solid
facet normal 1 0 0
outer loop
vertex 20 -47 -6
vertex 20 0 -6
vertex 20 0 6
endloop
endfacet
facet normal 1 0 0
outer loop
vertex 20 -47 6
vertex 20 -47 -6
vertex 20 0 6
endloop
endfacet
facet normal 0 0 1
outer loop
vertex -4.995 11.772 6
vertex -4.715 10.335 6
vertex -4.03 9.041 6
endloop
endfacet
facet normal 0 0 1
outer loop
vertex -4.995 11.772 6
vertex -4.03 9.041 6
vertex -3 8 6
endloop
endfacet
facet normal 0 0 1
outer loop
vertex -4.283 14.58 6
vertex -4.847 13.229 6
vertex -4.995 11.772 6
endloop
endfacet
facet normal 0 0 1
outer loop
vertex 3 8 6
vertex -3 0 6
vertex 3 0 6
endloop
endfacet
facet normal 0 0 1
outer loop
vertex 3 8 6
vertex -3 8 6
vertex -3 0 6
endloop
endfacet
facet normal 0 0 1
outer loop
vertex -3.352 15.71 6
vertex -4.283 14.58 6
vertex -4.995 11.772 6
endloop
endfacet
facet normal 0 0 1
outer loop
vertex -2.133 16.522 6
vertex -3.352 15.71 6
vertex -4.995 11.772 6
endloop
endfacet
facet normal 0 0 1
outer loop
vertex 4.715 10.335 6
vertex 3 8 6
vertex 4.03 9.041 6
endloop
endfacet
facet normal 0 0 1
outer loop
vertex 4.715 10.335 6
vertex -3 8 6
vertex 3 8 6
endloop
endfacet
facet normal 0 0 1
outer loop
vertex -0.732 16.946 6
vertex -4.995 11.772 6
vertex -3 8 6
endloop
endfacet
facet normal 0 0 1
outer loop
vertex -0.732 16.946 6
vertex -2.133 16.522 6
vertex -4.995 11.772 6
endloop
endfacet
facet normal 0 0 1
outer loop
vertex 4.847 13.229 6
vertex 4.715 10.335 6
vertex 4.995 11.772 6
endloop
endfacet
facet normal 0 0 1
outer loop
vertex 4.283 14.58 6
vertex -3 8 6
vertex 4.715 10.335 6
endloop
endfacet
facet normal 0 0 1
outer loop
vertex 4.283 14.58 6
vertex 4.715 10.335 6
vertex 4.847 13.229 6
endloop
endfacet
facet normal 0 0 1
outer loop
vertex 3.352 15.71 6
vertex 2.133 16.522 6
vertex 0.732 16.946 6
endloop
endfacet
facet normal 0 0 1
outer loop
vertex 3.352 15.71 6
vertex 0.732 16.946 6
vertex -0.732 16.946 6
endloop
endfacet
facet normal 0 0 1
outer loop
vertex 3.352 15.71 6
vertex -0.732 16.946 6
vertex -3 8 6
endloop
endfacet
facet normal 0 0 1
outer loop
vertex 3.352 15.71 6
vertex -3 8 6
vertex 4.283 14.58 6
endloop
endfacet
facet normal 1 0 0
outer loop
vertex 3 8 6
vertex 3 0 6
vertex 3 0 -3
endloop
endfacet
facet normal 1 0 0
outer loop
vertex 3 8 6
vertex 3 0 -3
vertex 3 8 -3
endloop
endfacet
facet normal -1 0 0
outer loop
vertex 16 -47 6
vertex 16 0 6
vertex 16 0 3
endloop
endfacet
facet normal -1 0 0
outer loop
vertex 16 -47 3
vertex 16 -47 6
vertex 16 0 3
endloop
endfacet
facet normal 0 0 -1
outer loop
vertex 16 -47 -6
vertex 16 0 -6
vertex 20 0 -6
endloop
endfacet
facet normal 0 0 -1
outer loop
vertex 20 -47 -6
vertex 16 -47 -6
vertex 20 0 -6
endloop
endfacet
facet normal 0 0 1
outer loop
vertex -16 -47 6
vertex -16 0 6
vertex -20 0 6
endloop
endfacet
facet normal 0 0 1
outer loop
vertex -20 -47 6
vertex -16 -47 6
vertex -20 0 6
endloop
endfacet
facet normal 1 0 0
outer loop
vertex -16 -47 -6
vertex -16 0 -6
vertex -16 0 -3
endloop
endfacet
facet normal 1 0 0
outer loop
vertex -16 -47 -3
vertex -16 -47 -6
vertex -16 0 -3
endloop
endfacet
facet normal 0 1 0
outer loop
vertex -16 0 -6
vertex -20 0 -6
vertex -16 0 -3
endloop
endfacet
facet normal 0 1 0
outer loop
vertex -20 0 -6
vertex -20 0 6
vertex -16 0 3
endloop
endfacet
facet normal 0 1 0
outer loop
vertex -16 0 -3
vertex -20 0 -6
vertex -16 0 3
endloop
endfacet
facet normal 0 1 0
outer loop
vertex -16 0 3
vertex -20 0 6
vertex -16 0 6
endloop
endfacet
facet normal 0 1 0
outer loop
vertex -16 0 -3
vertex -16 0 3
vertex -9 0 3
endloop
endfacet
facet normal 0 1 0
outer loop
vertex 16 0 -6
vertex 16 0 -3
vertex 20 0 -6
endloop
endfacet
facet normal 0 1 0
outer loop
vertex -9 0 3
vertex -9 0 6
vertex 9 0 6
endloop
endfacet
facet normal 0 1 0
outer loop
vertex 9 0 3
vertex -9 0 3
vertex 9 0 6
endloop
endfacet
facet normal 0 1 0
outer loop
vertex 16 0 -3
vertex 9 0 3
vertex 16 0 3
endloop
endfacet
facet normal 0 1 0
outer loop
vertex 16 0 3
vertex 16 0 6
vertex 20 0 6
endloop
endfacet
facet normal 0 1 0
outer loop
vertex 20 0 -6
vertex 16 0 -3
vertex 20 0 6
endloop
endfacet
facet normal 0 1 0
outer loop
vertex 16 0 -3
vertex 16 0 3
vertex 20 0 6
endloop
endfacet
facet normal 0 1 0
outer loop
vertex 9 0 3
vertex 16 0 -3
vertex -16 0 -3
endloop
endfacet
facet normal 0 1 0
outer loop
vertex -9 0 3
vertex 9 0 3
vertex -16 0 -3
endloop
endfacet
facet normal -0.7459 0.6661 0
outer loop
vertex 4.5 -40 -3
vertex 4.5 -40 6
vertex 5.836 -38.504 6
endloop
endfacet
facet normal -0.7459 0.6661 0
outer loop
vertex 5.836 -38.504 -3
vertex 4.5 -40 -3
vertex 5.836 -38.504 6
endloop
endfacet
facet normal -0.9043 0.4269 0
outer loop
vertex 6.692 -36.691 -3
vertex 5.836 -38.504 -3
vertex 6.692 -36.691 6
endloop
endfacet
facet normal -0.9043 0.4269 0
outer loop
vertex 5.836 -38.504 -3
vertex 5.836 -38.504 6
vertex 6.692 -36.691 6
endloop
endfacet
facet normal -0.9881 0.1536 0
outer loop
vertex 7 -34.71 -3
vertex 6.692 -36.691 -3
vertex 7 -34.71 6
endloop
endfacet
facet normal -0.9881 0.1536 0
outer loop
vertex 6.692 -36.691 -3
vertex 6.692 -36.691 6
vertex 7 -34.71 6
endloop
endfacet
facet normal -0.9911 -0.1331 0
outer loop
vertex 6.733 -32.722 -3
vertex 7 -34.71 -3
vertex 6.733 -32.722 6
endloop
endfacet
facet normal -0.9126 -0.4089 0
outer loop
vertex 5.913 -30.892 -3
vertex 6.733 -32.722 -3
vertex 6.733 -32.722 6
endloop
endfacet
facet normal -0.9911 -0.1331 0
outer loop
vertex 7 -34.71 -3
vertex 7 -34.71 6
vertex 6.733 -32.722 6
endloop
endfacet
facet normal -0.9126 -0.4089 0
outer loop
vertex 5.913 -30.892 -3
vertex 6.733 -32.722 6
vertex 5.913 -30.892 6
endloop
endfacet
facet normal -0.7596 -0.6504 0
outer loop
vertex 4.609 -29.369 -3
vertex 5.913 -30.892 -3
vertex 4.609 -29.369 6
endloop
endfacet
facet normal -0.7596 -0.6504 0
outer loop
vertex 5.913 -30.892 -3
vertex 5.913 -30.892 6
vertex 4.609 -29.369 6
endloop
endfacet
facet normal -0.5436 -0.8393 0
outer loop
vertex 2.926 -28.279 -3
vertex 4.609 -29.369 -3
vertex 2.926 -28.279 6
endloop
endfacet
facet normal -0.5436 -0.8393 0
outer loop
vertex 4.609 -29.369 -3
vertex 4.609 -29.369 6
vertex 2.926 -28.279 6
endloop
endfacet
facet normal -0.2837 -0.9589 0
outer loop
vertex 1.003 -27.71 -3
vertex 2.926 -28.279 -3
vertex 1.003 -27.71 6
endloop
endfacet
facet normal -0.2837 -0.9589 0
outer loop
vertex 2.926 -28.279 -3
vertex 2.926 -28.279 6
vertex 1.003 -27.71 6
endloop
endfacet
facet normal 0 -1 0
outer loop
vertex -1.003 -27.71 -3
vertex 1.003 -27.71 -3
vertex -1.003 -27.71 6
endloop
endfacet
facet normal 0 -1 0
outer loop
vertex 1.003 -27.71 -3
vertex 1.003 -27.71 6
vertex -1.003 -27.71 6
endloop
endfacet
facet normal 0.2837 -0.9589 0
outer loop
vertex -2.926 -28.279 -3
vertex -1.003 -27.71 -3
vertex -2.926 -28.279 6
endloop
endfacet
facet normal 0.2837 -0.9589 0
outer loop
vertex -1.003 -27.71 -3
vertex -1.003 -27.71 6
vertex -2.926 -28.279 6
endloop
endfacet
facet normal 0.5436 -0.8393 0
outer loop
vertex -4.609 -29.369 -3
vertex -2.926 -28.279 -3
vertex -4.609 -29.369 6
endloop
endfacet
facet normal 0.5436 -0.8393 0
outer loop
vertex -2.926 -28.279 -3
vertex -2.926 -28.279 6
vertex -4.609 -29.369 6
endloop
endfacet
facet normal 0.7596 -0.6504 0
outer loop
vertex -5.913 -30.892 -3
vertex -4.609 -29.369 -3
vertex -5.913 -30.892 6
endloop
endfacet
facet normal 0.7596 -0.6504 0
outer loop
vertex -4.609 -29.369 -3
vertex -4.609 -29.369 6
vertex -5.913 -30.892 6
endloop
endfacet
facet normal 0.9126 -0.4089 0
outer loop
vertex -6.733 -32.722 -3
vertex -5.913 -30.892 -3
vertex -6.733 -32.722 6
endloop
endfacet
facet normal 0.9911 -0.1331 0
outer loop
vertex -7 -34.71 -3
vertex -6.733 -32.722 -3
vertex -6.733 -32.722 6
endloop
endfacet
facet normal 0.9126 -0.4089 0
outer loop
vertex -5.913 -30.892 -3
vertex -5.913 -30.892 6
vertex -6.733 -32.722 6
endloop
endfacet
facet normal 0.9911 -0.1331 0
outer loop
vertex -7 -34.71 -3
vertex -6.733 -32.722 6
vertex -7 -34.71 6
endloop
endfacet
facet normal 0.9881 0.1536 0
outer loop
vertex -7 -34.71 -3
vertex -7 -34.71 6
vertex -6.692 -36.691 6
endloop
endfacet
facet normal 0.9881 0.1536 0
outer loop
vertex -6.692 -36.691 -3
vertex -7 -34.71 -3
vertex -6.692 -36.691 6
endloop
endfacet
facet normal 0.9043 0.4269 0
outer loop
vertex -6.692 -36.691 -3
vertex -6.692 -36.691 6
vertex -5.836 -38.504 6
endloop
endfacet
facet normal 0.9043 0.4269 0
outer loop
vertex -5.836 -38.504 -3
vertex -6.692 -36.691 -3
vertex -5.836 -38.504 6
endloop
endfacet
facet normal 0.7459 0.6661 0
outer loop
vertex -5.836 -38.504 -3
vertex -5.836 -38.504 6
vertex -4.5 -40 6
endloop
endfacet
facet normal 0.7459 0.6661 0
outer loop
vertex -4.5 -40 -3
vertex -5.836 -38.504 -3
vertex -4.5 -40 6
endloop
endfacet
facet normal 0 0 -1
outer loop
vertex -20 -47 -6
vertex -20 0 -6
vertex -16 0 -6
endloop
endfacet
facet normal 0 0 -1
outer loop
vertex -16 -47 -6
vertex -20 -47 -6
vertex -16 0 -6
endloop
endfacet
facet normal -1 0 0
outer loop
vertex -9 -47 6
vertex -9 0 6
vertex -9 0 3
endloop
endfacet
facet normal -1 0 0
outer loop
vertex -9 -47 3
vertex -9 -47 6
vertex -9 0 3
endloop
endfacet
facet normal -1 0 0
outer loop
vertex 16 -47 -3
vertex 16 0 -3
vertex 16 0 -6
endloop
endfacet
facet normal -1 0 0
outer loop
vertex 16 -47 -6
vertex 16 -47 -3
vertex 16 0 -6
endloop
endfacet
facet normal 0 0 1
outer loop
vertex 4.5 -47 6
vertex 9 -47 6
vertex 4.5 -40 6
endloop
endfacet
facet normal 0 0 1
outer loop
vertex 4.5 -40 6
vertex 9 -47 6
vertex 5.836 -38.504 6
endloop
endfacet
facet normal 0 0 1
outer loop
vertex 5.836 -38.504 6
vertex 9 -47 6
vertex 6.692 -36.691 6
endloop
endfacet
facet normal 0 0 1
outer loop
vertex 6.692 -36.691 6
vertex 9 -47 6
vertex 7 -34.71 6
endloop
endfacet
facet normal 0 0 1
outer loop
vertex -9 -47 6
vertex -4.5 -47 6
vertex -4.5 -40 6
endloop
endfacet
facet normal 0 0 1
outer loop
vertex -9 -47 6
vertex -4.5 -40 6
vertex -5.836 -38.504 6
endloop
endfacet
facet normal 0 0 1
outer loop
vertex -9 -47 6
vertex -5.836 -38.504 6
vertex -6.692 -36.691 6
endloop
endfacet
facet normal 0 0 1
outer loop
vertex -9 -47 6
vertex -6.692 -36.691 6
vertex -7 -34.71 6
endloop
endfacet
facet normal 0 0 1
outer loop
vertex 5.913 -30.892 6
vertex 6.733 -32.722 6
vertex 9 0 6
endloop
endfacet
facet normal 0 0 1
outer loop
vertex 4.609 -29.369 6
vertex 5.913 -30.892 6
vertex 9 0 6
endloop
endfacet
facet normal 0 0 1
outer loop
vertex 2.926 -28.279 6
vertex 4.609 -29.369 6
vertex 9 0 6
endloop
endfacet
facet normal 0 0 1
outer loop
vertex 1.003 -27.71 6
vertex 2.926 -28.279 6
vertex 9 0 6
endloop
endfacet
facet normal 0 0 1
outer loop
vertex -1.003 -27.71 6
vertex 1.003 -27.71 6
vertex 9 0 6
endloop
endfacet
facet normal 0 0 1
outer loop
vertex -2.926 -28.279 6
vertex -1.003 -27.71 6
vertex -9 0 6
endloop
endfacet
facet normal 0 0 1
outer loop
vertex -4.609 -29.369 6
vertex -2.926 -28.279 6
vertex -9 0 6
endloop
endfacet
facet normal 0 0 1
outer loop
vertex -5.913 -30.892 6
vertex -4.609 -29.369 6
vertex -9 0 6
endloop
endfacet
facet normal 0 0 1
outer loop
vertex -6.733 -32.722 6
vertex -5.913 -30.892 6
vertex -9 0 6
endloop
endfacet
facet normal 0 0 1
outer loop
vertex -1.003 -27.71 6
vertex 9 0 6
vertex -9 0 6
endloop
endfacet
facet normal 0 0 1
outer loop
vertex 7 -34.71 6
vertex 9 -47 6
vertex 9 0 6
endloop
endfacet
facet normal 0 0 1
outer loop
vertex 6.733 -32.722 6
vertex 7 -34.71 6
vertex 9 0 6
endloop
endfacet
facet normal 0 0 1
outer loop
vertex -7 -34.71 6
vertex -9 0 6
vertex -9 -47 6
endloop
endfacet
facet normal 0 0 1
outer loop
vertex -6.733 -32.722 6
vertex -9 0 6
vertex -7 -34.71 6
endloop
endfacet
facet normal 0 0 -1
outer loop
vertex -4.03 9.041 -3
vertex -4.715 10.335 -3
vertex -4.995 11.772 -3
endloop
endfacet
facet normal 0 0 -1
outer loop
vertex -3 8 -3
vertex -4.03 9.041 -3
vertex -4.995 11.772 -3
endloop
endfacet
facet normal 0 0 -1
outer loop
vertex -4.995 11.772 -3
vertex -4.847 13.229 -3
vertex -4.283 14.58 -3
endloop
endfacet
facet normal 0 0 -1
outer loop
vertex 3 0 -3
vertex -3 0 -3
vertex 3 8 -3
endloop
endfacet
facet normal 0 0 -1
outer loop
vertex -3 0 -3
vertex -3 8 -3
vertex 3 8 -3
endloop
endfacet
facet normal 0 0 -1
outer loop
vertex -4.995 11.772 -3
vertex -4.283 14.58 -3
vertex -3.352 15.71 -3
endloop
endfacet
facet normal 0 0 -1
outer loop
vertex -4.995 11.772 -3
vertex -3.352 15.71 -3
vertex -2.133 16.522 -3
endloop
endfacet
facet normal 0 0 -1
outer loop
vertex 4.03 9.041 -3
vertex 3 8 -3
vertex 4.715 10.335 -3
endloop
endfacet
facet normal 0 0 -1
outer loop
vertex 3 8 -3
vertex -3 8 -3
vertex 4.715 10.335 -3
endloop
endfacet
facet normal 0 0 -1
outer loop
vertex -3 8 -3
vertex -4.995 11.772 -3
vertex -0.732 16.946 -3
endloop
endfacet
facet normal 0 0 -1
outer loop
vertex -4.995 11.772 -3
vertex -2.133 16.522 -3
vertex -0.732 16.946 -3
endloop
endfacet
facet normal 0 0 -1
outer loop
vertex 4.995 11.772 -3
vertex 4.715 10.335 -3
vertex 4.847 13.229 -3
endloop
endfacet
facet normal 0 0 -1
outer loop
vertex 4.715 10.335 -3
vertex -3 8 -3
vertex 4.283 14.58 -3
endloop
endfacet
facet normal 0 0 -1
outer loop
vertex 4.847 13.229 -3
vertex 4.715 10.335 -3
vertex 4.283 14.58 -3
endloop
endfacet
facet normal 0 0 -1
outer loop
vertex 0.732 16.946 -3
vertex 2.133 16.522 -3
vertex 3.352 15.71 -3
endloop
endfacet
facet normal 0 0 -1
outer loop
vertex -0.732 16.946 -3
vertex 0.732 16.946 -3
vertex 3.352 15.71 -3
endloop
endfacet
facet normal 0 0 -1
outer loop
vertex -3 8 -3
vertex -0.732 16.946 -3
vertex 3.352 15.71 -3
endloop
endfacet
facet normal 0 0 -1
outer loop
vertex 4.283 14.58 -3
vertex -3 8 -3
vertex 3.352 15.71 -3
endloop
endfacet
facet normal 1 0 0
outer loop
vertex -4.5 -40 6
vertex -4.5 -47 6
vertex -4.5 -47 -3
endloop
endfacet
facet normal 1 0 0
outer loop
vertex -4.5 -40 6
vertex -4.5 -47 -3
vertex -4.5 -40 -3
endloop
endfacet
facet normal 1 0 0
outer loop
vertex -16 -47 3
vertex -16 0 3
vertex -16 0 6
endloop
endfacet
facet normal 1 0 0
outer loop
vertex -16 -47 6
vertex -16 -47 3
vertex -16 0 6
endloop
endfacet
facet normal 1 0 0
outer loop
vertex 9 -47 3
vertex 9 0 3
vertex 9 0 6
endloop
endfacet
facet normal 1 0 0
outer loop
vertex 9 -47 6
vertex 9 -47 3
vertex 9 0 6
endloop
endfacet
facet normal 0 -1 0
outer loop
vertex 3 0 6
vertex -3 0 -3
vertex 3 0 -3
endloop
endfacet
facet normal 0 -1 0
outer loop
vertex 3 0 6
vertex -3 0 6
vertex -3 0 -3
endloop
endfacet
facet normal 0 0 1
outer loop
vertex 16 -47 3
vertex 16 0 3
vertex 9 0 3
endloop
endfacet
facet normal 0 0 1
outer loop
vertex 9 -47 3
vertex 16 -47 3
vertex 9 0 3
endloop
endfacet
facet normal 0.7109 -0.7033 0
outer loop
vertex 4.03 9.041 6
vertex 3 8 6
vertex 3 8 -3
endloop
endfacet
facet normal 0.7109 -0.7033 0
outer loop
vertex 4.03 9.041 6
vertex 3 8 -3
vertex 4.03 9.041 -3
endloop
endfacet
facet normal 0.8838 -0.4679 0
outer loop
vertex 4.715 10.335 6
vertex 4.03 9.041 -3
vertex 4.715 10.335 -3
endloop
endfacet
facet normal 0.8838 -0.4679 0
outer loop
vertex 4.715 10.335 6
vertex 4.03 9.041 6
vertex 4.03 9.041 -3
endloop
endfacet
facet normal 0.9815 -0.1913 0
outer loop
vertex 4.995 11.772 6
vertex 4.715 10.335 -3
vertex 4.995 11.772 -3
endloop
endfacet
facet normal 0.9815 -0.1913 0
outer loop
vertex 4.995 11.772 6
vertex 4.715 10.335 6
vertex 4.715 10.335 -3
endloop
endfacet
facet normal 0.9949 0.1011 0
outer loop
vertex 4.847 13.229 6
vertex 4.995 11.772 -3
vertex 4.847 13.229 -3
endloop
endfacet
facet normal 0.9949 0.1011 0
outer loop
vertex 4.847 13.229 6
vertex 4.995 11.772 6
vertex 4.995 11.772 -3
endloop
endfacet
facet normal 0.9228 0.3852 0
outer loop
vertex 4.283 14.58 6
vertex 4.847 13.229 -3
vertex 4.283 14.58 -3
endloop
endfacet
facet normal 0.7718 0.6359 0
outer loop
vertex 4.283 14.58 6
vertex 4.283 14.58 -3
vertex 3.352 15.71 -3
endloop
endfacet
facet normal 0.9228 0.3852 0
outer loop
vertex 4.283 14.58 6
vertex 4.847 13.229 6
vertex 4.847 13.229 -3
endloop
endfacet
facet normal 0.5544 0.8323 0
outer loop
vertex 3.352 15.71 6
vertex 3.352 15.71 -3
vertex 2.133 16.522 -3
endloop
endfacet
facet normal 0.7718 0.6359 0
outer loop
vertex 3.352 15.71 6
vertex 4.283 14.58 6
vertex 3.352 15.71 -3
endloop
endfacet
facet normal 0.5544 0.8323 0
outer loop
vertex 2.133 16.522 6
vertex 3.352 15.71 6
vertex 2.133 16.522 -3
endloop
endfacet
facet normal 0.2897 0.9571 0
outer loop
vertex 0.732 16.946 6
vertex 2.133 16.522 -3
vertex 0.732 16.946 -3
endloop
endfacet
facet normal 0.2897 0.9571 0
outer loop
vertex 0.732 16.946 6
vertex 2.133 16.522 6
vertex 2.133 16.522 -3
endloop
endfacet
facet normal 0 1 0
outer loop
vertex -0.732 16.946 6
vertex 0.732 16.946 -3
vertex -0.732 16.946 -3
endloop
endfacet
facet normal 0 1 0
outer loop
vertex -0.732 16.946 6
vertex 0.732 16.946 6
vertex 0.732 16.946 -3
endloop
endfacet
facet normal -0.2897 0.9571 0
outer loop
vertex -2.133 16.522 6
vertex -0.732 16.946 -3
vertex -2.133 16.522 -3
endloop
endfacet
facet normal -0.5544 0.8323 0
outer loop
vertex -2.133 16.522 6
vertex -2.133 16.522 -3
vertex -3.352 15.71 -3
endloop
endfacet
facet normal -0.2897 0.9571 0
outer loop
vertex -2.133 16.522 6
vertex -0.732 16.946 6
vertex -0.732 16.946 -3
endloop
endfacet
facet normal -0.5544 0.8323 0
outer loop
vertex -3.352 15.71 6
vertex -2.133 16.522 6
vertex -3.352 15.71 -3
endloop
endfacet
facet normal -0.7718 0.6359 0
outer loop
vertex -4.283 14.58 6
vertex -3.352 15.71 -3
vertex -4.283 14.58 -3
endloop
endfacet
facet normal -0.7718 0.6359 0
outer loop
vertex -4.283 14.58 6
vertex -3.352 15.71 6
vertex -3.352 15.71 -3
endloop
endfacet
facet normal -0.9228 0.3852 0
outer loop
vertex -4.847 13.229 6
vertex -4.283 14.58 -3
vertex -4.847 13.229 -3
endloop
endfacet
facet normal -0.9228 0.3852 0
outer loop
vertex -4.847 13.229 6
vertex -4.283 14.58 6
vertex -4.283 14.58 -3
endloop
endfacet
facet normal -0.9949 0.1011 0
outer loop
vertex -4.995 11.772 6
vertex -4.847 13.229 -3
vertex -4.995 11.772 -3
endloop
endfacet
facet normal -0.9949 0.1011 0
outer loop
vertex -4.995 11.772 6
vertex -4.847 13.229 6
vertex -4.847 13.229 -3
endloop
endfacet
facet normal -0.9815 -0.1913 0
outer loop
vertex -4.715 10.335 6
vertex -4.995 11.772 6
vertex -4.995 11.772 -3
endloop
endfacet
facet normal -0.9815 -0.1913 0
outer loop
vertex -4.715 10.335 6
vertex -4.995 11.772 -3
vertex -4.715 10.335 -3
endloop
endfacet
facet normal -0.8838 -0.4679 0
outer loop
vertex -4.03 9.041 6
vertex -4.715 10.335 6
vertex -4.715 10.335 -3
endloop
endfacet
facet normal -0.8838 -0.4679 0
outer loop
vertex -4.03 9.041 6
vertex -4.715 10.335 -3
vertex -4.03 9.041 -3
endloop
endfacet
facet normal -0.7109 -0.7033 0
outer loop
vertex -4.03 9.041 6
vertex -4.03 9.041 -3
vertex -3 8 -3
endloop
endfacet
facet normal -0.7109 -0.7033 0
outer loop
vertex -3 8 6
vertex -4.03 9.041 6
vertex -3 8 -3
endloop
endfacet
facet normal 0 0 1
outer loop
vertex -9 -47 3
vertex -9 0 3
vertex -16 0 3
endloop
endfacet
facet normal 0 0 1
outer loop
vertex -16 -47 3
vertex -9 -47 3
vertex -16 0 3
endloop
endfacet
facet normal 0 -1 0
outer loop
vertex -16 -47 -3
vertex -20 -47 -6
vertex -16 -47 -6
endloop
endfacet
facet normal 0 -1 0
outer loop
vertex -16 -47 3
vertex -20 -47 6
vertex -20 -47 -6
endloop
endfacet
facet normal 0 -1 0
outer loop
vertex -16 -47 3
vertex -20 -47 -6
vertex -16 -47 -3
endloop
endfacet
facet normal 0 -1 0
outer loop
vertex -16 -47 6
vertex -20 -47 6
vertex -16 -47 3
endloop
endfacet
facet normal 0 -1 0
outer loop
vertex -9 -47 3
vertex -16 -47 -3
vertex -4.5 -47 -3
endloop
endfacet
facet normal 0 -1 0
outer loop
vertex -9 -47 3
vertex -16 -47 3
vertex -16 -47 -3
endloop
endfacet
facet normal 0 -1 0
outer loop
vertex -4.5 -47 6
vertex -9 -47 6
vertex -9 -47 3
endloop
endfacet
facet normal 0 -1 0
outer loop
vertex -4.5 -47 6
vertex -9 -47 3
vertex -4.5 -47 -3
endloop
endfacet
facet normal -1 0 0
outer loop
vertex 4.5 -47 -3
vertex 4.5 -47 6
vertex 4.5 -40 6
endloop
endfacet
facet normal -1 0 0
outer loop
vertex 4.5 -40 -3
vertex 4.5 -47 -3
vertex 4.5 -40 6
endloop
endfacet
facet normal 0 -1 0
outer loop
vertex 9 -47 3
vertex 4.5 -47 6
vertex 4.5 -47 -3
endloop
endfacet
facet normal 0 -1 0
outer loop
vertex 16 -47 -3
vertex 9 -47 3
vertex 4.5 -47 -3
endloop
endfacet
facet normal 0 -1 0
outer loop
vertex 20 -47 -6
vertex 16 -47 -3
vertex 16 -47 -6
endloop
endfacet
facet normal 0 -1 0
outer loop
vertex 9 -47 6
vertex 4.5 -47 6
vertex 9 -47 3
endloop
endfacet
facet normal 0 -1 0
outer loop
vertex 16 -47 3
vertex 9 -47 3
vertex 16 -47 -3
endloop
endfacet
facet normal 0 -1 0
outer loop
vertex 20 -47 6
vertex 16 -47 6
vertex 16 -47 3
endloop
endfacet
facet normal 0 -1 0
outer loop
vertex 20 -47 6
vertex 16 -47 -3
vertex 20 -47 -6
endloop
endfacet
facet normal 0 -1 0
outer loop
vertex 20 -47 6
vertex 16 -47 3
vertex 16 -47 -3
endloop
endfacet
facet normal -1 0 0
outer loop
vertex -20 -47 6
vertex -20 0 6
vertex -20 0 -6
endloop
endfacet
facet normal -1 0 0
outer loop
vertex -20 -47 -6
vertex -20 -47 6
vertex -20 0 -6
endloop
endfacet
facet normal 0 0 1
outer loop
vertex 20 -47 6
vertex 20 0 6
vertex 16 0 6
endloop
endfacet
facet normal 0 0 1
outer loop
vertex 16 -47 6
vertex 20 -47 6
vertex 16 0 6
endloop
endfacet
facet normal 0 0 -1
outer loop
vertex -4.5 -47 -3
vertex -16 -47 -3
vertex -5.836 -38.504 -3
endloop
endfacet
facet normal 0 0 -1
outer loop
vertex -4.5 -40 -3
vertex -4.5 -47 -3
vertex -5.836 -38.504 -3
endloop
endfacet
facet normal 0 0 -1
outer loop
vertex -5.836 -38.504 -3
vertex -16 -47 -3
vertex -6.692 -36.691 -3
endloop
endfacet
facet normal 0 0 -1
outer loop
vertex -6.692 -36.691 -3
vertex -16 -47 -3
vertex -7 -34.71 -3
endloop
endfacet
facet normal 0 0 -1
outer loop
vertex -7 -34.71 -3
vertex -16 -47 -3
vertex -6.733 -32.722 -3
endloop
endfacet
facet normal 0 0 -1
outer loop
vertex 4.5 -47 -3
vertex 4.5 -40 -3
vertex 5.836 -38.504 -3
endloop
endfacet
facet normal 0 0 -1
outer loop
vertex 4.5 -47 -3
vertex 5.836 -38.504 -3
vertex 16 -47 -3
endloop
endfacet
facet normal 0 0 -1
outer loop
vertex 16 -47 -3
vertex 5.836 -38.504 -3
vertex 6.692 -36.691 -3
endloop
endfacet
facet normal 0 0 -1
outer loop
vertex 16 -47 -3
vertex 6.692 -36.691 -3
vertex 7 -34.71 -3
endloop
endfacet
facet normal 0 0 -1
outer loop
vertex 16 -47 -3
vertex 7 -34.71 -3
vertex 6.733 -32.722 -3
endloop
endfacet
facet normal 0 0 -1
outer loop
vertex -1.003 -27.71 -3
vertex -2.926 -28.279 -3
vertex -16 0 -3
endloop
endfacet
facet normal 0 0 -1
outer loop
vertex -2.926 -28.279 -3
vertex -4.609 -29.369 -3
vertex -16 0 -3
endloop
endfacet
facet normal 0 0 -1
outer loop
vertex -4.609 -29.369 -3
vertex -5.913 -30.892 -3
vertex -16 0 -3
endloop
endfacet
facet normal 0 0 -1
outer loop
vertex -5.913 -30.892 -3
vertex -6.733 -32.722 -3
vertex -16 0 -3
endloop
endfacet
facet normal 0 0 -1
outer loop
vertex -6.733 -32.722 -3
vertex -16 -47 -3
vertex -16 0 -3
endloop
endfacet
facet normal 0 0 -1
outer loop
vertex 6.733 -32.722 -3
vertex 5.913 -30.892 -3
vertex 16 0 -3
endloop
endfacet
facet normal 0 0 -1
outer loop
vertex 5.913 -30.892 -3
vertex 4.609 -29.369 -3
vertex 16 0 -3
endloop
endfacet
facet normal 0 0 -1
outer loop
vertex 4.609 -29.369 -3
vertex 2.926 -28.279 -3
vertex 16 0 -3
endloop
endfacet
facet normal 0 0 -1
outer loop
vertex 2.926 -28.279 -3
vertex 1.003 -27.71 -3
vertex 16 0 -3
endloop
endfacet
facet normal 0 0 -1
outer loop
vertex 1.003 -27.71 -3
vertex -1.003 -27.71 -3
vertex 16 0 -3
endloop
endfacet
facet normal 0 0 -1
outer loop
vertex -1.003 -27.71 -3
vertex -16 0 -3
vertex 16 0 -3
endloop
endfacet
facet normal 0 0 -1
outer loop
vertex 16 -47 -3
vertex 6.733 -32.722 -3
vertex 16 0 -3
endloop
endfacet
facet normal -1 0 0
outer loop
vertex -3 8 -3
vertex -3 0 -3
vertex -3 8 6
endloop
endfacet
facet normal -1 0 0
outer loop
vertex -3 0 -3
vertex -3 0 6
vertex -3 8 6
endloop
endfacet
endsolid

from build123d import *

# Parameters (mm, degrees)
PAD_DEPTH         = 47
POCKET_DEPTH      = 12.001
PAD001_DEPTH      = 6
PAD001_DEPTH_BACK = 3


with BuildPart() as body:
    # Sketch → Pad (new body)
    with BuildSketch(Plane.XZ):
        Polygon((-20, 6), (-20, -6), (-16, -6), (-16, -3), (-9, -3), (9, -3), (16, -3), (16, -6), (20, -6), (20, 6), (16, 6), (16, 3), (9, 3), (9, 6), (-9, 6), (-9, 3), (-16, 3), (-16, 6), align=None)
    extrude(amount=PAD_DEPTH)

    # Sketch002 (on Face14 of Pad) → Pocket (cut, through all)
    with BuildSketch(Plane(origin=(0, 0, 6), x_dir=(-1, 0, 0), z_dir=(0, 0, 1))):
        with BuildLine():
            Line((-4.5, 47), (4.5, 47))
            Line((4.5, 47), (4.5, 40))
            ThreePointArc((-4.5, 40), (0, 27.638097), (4.5, 40))
            Line((-4.5, 47), (-4.5, 40))
        make_face()
    extrude(amount=-POCKET_DEPTH, mode=Mode.SUBTRACT)


with BuildPart() as body001:
    # Sketch001 → Pad001 (new body, two sides)
    with BuildSketch(Plane.XY) as pad001_sk:
        with BuildLine():
            Line((-3, 0), (3, 0))
            Line((3, 0), (3, 8))
            ThreePointArc((3, 8), (0, 17), (-3, 8))
            Line((-3, 0), (-3, 8))
        make_face()
    extrude(amount=PAD001_DEPTH)
    extrude(pad001_sk.sketch, amount=-PAD001_DEPTH_BACK)


solid = Compound([body.part, body001.part])
